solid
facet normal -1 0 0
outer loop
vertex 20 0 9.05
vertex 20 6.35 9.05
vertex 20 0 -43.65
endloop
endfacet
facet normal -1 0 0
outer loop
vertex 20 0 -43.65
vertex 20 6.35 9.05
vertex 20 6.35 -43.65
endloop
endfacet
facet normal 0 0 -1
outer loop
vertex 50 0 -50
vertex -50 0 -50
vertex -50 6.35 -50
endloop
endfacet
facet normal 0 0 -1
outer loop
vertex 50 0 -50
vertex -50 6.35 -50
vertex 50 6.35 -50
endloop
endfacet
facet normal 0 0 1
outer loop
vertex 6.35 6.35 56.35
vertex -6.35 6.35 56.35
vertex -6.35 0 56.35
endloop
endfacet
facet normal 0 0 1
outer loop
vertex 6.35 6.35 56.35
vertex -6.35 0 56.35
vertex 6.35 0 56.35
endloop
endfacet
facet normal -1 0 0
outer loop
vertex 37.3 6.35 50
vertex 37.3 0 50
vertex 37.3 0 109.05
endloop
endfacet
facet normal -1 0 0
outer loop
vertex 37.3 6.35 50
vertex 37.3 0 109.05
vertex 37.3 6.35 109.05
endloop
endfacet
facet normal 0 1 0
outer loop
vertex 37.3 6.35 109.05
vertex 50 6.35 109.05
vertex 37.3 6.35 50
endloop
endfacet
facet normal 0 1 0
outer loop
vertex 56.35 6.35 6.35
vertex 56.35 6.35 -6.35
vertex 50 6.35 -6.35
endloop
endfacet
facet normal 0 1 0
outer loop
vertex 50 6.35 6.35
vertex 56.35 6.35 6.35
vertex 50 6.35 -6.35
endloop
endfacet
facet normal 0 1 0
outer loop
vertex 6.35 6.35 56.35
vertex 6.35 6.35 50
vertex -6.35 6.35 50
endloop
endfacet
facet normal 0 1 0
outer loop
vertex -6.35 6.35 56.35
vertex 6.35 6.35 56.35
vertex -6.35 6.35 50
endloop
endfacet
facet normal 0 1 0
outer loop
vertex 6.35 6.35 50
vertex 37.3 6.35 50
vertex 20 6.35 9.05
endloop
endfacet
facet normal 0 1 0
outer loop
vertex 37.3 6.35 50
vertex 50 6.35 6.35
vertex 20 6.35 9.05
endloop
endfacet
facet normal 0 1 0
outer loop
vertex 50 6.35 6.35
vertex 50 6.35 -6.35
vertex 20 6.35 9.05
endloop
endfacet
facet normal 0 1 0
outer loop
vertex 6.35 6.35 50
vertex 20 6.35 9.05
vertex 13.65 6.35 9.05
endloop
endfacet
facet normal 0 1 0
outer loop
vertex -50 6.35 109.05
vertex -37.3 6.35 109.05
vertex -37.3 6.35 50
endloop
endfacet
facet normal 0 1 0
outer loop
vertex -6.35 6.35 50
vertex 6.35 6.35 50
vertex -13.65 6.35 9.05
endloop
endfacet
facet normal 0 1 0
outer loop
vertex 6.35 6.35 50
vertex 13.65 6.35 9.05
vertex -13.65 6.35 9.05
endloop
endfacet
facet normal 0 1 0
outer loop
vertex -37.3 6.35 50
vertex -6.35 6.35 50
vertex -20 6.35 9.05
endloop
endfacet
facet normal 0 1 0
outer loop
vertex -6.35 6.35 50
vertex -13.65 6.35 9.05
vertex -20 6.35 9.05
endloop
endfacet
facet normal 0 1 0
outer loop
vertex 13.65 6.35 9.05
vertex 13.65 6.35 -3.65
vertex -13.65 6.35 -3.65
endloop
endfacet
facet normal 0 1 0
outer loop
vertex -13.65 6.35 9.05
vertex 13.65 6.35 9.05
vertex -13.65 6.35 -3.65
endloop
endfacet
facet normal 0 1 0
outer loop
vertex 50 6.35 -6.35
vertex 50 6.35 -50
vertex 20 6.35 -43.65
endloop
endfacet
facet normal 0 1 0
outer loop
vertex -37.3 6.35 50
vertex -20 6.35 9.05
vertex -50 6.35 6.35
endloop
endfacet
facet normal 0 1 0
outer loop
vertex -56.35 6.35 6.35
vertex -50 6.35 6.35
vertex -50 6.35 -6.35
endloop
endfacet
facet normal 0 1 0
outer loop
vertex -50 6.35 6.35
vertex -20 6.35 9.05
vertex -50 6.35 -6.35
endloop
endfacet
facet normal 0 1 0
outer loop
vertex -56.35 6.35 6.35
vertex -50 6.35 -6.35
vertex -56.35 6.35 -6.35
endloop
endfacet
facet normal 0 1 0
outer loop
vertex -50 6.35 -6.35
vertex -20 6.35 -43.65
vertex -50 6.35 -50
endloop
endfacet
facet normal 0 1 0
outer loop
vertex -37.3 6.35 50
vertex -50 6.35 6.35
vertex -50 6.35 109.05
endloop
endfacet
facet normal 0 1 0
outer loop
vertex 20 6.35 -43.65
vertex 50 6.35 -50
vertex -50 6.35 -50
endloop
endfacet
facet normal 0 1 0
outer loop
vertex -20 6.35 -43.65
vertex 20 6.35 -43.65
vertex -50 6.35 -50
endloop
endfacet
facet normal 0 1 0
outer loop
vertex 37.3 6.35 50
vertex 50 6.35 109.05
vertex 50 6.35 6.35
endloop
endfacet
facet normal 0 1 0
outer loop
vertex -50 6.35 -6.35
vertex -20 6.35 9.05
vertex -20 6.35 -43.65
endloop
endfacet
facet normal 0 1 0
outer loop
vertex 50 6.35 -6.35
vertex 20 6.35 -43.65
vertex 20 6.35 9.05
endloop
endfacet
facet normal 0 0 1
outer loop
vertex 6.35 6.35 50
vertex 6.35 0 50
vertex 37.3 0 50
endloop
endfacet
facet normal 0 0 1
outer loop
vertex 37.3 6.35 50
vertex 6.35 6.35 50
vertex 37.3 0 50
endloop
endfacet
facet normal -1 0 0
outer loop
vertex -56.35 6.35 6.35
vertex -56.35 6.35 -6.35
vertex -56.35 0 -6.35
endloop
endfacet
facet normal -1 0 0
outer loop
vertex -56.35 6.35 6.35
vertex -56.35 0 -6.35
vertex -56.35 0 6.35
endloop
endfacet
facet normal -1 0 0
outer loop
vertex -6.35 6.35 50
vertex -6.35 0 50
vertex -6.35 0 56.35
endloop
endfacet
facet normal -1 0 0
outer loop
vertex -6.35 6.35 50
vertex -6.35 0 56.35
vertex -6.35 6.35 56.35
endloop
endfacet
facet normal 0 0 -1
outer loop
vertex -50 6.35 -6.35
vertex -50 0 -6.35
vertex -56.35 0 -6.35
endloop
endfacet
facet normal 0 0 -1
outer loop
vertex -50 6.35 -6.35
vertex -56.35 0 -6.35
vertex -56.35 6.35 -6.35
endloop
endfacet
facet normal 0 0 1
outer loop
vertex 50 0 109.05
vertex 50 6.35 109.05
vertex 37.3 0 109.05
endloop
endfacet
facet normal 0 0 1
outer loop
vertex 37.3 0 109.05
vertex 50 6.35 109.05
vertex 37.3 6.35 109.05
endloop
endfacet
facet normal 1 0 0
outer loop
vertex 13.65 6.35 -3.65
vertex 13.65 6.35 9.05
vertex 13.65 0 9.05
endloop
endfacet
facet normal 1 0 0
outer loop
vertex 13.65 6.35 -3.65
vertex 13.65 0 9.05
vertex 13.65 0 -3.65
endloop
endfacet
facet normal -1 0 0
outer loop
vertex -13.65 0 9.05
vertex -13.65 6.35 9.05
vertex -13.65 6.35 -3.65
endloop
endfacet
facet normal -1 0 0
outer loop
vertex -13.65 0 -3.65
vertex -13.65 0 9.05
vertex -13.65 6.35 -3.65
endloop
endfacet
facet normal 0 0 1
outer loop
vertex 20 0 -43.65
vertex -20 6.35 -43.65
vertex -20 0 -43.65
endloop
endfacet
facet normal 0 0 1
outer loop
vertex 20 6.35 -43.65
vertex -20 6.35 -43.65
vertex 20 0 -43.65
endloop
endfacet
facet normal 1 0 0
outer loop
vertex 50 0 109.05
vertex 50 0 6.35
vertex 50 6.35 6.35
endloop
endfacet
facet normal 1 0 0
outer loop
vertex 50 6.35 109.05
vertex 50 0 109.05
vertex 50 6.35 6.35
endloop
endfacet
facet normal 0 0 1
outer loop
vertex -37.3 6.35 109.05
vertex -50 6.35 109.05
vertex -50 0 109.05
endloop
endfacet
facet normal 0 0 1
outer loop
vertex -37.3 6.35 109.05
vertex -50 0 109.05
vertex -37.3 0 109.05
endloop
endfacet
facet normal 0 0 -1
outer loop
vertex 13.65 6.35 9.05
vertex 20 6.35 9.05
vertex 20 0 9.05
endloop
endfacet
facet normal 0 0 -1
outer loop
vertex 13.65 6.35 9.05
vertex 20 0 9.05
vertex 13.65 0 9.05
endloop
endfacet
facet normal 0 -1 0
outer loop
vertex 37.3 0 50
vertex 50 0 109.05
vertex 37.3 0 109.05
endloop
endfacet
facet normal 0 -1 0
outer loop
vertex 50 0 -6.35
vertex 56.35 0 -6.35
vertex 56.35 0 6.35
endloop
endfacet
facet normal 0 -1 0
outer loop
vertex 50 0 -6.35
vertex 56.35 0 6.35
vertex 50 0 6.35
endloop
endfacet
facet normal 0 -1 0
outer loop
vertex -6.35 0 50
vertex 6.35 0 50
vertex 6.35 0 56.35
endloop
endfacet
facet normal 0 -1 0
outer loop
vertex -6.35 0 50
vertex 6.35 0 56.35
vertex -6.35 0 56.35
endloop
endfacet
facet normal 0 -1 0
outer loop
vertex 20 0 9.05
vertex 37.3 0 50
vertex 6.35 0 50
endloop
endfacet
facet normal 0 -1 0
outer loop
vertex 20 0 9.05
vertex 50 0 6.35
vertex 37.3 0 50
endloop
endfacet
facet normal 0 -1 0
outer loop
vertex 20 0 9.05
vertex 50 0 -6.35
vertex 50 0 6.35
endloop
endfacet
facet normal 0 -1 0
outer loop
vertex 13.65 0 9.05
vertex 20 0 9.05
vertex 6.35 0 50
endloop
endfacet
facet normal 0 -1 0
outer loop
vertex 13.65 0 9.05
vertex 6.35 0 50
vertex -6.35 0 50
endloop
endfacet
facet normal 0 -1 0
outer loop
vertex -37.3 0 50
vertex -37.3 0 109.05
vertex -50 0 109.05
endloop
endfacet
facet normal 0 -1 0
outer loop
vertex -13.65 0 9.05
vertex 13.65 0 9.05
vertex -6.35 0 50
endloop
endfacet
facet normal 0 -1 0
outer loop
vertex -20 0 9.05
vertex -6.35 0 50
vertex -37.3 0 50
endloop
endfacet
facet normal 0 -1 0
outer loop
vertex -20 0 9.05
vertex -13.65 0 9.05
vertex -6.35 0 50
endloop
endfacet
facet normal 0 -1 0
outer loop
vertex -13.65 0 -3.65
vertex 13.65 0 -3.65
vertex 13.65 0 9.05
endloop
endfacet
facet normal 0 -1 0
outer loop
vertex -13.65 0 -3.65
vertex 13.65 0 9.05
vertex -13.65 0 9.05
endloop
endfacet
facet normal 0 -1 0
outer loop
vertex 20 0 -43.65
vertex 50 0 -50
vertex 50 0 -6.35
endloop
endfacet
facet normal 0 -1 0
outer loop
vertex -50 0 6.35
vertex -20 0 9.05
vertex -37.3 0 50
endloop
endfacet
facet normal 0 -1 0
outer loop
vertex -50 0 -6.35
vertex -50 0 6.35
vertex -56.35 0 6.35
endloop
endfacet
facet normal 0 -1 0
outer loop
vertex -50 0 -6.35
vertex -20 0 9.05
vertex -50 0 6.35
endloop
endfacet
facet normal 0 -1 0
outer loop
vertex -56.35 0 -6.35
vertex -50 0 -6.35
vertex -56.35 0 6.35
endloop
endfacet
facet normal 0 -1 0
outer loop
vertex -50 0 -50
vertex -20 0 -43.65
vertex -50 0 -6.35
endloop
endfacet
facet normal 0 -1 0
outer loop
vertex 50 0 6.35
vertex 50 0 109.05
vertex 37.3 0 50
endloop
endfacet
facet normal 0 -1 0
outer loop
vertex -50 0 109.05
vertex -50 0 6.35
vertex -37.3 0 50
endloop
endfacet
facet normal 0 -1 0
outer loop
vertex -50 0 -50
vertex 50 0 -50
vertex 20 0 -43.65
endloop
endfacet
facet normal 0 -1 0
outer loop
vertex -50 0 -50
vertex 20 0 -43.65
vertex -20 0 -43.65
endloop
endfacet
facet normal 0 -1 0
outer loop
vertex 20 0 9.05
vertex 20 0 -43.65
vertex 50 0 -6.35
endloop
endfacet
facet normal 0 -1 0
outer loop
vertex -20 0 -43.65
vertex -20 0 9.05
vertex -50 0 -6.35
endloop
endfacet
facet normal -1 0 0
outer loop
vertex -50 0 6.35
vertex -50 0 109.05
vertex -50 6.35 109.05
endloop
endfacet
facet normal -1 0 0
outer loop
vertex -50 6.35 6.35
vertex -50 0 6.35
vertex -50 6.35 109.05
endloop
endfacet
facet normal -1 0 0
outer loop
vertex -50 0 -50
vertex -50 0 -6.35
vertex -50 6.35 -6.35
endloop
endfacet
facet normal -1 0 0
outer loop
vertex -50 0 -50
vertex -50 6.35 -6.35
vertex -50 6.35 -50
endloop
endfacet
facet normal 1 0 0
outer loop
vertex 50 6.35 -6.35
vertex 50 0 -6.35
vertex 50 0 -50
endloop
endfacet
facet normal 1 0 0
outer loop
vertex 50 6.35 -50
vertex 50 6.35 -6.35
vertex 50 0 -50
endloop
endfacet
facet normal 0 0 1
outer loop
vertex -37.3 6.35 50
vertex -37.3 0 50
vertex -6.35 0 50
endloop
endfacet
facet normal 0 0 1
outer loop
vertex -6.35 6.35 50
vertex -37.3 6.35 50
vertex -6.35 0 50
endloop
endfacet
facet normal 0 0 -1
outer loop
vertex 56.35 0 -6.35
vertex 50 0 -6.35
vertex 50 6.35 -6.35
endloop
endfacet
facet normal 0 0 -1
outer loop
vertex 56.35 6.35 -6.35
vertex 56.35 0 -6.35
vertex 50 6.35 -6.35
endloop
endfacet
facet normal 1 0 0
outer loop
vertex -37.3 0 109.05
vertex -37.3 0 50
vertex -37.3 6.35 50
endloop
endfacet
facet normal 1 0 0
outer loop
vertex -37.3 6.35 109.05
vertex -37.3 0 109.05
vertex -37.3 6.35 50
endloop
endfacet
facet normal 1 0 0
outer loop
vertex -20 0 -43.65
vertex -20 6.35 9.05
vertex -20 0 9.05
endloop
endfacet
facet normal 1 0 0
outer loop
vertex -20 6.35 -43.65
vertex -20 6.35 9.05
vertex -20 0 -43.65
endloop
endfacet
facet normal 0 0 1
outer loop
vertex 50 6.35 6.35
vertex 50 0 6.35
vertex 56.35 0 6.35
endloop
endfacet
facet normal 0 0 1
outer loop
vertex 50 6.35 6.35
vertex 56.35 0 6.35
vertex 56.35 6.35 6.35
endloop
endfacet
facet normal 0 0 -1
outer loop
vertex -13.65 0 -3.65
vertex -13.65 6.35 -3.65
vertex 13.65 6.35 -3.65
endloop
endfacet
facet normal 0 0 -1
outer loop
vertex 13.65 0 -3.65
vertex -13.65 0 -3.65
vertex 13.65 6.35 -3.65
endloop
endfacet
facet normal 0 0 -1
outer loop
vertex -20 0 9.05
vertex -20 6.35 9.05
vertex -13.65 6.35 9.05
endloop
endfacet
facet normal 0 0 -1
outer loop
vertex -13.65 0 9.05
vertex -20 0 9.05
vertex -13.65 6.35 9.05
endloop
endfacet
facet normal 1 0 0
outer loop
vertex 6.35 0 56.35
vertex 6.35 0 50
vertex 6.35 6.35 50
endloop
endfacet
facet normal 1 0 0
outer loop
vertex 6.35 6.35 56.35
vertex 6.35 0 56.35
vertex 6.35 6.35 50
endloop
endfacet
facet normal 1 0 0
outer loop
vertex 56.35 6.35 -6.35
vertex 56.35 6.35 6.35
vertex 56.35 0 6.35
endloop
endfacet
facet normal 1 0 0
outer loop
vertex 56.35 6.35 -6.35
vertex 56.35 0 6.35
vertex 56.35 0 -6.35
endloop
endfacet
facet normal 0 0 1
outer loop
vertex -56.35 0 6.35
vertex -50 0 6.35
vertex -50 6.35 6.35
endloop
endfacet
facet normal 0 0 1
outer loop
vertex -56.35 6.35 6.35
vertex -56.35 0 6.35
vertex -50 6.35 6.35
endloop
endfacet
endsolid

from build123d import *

# Parameters (mm, degrees)
SKETCH1_W           = 100
SKETCH1_H           = 100
BOSS_EXTRUDE1_DEPTH = 6.35
SKETCH2_W           = 12.7
SKETCH2_H           = 6.35
BOSS_EXTRUDE2_DEPTH = 6.35
CIRPATTERN1_COUNT   = 3
CIRPATTERN1_ANGLE   = 180
SKETCH4_W           = 12.7
SKETCH4_H           = 6.35
BOSS_EXTRUDE3_DEPTH = 59.05
SKETCH5_W           = 40
SKETCH5_H           = 40
CUT_EXTRUDE1_DEPTH  = 123.91276378
SKETCH6_W           = 6.35
SKETCH6_H           = 12.7
CUT_EXTRUDE2_DEPTH  = 123.91276378


with BuildPart() as part:
    # Sketch1 → Boss-Extrude1 (new body)
    with BuildSketch(Plane(origin=(0, 0, 0), x_dir=(1, 0, 0), z_dir=(0, 1, 0))):
        Rectangle(SKETCH1_W, SKETCH1_H)
    extrude(amount=BOSS_EXTRUDE1_DEPTH)

    # Sketch2 → Boss-Extrude2 (add)
    with BuildSketch(Plane.ZY.offset(50)):
        with Locations((0, 3.175)):
            Rectangle(SKETCH2_W, SKETCH2_H)
    boss_extrude2 = extrude(amount=BOSS_EXTRUDE2_DEPTH)

    # CirPattern1: Boss-Extrude2 ×3 about axis
    cirpattern1_axis = Axis((0, 6.35, 0), (0, 1, 0))
    for i in range(1, CIRPATTERN1_COUNT):
        add(boss_extrude2.rotate(cirpattern1_axis, i * CIRPATTERN1_ANGLE / (CIRPATTERN1_COUNT - 1)))

    # Sketch4 → Boss-Extrude3 (add)
    with BuildSketch(Plane.XY.offset(50)):
        with Locations((-43.65, 3.175)):
            Rectangle(SKETCH4_W, SKETCH4_H)
    boss_extrude3 = extrude(amount=BOSS_EXTRUDE3_DEPTH)

    # Mirror1: Boss-Extrude3 across plane
    add(boss_extrude3.mirror(Plane(origin=(0, 0, 0), x_dir=(0, 0, 1), z_dir=(1, 0, 0))))

    # Sketch5 → Cut-Extrude1 (cut, through all)
    with BuildSketch(Plane(origin=(0, 6.35, 0), x_dir=(1, 0, 0), z_dir=(0, 1, 0))):
        with Locations((0, 23.65)):
            Rectangle(SKETCH5_W, SKETCH5_H)
    extrude(amount=-CUT_EXTRUDE1_DEPTH, mode=Mode.SUBTRACT)

    # Sketch6 → Cut-Extrude2 (cut, through all)
    with BuildSketch(Plane(origin=(0, 6.35, 0), x_dir=(1, 0, 0), z_dir=(0, 1, 0))):
        with Locations((-16.825, -2.7)):
            Rectangle(SKETCH6_W, SKETCH6_H)
    cut_extrude2 = extrude(amount=-CUT_EXTRUDE2_DEPTH, mode=Mode.SUBTRACT)

    # Mirror2: Cut-Extrude2 across plane
    add(cut_extrude2.mirror(Plane(origin=(0, 0, 0), x_dir=(0, 0, 1), z_dir=(1, 0, 0))), mode=Mode.SUBTRACT)


solid = part.part
